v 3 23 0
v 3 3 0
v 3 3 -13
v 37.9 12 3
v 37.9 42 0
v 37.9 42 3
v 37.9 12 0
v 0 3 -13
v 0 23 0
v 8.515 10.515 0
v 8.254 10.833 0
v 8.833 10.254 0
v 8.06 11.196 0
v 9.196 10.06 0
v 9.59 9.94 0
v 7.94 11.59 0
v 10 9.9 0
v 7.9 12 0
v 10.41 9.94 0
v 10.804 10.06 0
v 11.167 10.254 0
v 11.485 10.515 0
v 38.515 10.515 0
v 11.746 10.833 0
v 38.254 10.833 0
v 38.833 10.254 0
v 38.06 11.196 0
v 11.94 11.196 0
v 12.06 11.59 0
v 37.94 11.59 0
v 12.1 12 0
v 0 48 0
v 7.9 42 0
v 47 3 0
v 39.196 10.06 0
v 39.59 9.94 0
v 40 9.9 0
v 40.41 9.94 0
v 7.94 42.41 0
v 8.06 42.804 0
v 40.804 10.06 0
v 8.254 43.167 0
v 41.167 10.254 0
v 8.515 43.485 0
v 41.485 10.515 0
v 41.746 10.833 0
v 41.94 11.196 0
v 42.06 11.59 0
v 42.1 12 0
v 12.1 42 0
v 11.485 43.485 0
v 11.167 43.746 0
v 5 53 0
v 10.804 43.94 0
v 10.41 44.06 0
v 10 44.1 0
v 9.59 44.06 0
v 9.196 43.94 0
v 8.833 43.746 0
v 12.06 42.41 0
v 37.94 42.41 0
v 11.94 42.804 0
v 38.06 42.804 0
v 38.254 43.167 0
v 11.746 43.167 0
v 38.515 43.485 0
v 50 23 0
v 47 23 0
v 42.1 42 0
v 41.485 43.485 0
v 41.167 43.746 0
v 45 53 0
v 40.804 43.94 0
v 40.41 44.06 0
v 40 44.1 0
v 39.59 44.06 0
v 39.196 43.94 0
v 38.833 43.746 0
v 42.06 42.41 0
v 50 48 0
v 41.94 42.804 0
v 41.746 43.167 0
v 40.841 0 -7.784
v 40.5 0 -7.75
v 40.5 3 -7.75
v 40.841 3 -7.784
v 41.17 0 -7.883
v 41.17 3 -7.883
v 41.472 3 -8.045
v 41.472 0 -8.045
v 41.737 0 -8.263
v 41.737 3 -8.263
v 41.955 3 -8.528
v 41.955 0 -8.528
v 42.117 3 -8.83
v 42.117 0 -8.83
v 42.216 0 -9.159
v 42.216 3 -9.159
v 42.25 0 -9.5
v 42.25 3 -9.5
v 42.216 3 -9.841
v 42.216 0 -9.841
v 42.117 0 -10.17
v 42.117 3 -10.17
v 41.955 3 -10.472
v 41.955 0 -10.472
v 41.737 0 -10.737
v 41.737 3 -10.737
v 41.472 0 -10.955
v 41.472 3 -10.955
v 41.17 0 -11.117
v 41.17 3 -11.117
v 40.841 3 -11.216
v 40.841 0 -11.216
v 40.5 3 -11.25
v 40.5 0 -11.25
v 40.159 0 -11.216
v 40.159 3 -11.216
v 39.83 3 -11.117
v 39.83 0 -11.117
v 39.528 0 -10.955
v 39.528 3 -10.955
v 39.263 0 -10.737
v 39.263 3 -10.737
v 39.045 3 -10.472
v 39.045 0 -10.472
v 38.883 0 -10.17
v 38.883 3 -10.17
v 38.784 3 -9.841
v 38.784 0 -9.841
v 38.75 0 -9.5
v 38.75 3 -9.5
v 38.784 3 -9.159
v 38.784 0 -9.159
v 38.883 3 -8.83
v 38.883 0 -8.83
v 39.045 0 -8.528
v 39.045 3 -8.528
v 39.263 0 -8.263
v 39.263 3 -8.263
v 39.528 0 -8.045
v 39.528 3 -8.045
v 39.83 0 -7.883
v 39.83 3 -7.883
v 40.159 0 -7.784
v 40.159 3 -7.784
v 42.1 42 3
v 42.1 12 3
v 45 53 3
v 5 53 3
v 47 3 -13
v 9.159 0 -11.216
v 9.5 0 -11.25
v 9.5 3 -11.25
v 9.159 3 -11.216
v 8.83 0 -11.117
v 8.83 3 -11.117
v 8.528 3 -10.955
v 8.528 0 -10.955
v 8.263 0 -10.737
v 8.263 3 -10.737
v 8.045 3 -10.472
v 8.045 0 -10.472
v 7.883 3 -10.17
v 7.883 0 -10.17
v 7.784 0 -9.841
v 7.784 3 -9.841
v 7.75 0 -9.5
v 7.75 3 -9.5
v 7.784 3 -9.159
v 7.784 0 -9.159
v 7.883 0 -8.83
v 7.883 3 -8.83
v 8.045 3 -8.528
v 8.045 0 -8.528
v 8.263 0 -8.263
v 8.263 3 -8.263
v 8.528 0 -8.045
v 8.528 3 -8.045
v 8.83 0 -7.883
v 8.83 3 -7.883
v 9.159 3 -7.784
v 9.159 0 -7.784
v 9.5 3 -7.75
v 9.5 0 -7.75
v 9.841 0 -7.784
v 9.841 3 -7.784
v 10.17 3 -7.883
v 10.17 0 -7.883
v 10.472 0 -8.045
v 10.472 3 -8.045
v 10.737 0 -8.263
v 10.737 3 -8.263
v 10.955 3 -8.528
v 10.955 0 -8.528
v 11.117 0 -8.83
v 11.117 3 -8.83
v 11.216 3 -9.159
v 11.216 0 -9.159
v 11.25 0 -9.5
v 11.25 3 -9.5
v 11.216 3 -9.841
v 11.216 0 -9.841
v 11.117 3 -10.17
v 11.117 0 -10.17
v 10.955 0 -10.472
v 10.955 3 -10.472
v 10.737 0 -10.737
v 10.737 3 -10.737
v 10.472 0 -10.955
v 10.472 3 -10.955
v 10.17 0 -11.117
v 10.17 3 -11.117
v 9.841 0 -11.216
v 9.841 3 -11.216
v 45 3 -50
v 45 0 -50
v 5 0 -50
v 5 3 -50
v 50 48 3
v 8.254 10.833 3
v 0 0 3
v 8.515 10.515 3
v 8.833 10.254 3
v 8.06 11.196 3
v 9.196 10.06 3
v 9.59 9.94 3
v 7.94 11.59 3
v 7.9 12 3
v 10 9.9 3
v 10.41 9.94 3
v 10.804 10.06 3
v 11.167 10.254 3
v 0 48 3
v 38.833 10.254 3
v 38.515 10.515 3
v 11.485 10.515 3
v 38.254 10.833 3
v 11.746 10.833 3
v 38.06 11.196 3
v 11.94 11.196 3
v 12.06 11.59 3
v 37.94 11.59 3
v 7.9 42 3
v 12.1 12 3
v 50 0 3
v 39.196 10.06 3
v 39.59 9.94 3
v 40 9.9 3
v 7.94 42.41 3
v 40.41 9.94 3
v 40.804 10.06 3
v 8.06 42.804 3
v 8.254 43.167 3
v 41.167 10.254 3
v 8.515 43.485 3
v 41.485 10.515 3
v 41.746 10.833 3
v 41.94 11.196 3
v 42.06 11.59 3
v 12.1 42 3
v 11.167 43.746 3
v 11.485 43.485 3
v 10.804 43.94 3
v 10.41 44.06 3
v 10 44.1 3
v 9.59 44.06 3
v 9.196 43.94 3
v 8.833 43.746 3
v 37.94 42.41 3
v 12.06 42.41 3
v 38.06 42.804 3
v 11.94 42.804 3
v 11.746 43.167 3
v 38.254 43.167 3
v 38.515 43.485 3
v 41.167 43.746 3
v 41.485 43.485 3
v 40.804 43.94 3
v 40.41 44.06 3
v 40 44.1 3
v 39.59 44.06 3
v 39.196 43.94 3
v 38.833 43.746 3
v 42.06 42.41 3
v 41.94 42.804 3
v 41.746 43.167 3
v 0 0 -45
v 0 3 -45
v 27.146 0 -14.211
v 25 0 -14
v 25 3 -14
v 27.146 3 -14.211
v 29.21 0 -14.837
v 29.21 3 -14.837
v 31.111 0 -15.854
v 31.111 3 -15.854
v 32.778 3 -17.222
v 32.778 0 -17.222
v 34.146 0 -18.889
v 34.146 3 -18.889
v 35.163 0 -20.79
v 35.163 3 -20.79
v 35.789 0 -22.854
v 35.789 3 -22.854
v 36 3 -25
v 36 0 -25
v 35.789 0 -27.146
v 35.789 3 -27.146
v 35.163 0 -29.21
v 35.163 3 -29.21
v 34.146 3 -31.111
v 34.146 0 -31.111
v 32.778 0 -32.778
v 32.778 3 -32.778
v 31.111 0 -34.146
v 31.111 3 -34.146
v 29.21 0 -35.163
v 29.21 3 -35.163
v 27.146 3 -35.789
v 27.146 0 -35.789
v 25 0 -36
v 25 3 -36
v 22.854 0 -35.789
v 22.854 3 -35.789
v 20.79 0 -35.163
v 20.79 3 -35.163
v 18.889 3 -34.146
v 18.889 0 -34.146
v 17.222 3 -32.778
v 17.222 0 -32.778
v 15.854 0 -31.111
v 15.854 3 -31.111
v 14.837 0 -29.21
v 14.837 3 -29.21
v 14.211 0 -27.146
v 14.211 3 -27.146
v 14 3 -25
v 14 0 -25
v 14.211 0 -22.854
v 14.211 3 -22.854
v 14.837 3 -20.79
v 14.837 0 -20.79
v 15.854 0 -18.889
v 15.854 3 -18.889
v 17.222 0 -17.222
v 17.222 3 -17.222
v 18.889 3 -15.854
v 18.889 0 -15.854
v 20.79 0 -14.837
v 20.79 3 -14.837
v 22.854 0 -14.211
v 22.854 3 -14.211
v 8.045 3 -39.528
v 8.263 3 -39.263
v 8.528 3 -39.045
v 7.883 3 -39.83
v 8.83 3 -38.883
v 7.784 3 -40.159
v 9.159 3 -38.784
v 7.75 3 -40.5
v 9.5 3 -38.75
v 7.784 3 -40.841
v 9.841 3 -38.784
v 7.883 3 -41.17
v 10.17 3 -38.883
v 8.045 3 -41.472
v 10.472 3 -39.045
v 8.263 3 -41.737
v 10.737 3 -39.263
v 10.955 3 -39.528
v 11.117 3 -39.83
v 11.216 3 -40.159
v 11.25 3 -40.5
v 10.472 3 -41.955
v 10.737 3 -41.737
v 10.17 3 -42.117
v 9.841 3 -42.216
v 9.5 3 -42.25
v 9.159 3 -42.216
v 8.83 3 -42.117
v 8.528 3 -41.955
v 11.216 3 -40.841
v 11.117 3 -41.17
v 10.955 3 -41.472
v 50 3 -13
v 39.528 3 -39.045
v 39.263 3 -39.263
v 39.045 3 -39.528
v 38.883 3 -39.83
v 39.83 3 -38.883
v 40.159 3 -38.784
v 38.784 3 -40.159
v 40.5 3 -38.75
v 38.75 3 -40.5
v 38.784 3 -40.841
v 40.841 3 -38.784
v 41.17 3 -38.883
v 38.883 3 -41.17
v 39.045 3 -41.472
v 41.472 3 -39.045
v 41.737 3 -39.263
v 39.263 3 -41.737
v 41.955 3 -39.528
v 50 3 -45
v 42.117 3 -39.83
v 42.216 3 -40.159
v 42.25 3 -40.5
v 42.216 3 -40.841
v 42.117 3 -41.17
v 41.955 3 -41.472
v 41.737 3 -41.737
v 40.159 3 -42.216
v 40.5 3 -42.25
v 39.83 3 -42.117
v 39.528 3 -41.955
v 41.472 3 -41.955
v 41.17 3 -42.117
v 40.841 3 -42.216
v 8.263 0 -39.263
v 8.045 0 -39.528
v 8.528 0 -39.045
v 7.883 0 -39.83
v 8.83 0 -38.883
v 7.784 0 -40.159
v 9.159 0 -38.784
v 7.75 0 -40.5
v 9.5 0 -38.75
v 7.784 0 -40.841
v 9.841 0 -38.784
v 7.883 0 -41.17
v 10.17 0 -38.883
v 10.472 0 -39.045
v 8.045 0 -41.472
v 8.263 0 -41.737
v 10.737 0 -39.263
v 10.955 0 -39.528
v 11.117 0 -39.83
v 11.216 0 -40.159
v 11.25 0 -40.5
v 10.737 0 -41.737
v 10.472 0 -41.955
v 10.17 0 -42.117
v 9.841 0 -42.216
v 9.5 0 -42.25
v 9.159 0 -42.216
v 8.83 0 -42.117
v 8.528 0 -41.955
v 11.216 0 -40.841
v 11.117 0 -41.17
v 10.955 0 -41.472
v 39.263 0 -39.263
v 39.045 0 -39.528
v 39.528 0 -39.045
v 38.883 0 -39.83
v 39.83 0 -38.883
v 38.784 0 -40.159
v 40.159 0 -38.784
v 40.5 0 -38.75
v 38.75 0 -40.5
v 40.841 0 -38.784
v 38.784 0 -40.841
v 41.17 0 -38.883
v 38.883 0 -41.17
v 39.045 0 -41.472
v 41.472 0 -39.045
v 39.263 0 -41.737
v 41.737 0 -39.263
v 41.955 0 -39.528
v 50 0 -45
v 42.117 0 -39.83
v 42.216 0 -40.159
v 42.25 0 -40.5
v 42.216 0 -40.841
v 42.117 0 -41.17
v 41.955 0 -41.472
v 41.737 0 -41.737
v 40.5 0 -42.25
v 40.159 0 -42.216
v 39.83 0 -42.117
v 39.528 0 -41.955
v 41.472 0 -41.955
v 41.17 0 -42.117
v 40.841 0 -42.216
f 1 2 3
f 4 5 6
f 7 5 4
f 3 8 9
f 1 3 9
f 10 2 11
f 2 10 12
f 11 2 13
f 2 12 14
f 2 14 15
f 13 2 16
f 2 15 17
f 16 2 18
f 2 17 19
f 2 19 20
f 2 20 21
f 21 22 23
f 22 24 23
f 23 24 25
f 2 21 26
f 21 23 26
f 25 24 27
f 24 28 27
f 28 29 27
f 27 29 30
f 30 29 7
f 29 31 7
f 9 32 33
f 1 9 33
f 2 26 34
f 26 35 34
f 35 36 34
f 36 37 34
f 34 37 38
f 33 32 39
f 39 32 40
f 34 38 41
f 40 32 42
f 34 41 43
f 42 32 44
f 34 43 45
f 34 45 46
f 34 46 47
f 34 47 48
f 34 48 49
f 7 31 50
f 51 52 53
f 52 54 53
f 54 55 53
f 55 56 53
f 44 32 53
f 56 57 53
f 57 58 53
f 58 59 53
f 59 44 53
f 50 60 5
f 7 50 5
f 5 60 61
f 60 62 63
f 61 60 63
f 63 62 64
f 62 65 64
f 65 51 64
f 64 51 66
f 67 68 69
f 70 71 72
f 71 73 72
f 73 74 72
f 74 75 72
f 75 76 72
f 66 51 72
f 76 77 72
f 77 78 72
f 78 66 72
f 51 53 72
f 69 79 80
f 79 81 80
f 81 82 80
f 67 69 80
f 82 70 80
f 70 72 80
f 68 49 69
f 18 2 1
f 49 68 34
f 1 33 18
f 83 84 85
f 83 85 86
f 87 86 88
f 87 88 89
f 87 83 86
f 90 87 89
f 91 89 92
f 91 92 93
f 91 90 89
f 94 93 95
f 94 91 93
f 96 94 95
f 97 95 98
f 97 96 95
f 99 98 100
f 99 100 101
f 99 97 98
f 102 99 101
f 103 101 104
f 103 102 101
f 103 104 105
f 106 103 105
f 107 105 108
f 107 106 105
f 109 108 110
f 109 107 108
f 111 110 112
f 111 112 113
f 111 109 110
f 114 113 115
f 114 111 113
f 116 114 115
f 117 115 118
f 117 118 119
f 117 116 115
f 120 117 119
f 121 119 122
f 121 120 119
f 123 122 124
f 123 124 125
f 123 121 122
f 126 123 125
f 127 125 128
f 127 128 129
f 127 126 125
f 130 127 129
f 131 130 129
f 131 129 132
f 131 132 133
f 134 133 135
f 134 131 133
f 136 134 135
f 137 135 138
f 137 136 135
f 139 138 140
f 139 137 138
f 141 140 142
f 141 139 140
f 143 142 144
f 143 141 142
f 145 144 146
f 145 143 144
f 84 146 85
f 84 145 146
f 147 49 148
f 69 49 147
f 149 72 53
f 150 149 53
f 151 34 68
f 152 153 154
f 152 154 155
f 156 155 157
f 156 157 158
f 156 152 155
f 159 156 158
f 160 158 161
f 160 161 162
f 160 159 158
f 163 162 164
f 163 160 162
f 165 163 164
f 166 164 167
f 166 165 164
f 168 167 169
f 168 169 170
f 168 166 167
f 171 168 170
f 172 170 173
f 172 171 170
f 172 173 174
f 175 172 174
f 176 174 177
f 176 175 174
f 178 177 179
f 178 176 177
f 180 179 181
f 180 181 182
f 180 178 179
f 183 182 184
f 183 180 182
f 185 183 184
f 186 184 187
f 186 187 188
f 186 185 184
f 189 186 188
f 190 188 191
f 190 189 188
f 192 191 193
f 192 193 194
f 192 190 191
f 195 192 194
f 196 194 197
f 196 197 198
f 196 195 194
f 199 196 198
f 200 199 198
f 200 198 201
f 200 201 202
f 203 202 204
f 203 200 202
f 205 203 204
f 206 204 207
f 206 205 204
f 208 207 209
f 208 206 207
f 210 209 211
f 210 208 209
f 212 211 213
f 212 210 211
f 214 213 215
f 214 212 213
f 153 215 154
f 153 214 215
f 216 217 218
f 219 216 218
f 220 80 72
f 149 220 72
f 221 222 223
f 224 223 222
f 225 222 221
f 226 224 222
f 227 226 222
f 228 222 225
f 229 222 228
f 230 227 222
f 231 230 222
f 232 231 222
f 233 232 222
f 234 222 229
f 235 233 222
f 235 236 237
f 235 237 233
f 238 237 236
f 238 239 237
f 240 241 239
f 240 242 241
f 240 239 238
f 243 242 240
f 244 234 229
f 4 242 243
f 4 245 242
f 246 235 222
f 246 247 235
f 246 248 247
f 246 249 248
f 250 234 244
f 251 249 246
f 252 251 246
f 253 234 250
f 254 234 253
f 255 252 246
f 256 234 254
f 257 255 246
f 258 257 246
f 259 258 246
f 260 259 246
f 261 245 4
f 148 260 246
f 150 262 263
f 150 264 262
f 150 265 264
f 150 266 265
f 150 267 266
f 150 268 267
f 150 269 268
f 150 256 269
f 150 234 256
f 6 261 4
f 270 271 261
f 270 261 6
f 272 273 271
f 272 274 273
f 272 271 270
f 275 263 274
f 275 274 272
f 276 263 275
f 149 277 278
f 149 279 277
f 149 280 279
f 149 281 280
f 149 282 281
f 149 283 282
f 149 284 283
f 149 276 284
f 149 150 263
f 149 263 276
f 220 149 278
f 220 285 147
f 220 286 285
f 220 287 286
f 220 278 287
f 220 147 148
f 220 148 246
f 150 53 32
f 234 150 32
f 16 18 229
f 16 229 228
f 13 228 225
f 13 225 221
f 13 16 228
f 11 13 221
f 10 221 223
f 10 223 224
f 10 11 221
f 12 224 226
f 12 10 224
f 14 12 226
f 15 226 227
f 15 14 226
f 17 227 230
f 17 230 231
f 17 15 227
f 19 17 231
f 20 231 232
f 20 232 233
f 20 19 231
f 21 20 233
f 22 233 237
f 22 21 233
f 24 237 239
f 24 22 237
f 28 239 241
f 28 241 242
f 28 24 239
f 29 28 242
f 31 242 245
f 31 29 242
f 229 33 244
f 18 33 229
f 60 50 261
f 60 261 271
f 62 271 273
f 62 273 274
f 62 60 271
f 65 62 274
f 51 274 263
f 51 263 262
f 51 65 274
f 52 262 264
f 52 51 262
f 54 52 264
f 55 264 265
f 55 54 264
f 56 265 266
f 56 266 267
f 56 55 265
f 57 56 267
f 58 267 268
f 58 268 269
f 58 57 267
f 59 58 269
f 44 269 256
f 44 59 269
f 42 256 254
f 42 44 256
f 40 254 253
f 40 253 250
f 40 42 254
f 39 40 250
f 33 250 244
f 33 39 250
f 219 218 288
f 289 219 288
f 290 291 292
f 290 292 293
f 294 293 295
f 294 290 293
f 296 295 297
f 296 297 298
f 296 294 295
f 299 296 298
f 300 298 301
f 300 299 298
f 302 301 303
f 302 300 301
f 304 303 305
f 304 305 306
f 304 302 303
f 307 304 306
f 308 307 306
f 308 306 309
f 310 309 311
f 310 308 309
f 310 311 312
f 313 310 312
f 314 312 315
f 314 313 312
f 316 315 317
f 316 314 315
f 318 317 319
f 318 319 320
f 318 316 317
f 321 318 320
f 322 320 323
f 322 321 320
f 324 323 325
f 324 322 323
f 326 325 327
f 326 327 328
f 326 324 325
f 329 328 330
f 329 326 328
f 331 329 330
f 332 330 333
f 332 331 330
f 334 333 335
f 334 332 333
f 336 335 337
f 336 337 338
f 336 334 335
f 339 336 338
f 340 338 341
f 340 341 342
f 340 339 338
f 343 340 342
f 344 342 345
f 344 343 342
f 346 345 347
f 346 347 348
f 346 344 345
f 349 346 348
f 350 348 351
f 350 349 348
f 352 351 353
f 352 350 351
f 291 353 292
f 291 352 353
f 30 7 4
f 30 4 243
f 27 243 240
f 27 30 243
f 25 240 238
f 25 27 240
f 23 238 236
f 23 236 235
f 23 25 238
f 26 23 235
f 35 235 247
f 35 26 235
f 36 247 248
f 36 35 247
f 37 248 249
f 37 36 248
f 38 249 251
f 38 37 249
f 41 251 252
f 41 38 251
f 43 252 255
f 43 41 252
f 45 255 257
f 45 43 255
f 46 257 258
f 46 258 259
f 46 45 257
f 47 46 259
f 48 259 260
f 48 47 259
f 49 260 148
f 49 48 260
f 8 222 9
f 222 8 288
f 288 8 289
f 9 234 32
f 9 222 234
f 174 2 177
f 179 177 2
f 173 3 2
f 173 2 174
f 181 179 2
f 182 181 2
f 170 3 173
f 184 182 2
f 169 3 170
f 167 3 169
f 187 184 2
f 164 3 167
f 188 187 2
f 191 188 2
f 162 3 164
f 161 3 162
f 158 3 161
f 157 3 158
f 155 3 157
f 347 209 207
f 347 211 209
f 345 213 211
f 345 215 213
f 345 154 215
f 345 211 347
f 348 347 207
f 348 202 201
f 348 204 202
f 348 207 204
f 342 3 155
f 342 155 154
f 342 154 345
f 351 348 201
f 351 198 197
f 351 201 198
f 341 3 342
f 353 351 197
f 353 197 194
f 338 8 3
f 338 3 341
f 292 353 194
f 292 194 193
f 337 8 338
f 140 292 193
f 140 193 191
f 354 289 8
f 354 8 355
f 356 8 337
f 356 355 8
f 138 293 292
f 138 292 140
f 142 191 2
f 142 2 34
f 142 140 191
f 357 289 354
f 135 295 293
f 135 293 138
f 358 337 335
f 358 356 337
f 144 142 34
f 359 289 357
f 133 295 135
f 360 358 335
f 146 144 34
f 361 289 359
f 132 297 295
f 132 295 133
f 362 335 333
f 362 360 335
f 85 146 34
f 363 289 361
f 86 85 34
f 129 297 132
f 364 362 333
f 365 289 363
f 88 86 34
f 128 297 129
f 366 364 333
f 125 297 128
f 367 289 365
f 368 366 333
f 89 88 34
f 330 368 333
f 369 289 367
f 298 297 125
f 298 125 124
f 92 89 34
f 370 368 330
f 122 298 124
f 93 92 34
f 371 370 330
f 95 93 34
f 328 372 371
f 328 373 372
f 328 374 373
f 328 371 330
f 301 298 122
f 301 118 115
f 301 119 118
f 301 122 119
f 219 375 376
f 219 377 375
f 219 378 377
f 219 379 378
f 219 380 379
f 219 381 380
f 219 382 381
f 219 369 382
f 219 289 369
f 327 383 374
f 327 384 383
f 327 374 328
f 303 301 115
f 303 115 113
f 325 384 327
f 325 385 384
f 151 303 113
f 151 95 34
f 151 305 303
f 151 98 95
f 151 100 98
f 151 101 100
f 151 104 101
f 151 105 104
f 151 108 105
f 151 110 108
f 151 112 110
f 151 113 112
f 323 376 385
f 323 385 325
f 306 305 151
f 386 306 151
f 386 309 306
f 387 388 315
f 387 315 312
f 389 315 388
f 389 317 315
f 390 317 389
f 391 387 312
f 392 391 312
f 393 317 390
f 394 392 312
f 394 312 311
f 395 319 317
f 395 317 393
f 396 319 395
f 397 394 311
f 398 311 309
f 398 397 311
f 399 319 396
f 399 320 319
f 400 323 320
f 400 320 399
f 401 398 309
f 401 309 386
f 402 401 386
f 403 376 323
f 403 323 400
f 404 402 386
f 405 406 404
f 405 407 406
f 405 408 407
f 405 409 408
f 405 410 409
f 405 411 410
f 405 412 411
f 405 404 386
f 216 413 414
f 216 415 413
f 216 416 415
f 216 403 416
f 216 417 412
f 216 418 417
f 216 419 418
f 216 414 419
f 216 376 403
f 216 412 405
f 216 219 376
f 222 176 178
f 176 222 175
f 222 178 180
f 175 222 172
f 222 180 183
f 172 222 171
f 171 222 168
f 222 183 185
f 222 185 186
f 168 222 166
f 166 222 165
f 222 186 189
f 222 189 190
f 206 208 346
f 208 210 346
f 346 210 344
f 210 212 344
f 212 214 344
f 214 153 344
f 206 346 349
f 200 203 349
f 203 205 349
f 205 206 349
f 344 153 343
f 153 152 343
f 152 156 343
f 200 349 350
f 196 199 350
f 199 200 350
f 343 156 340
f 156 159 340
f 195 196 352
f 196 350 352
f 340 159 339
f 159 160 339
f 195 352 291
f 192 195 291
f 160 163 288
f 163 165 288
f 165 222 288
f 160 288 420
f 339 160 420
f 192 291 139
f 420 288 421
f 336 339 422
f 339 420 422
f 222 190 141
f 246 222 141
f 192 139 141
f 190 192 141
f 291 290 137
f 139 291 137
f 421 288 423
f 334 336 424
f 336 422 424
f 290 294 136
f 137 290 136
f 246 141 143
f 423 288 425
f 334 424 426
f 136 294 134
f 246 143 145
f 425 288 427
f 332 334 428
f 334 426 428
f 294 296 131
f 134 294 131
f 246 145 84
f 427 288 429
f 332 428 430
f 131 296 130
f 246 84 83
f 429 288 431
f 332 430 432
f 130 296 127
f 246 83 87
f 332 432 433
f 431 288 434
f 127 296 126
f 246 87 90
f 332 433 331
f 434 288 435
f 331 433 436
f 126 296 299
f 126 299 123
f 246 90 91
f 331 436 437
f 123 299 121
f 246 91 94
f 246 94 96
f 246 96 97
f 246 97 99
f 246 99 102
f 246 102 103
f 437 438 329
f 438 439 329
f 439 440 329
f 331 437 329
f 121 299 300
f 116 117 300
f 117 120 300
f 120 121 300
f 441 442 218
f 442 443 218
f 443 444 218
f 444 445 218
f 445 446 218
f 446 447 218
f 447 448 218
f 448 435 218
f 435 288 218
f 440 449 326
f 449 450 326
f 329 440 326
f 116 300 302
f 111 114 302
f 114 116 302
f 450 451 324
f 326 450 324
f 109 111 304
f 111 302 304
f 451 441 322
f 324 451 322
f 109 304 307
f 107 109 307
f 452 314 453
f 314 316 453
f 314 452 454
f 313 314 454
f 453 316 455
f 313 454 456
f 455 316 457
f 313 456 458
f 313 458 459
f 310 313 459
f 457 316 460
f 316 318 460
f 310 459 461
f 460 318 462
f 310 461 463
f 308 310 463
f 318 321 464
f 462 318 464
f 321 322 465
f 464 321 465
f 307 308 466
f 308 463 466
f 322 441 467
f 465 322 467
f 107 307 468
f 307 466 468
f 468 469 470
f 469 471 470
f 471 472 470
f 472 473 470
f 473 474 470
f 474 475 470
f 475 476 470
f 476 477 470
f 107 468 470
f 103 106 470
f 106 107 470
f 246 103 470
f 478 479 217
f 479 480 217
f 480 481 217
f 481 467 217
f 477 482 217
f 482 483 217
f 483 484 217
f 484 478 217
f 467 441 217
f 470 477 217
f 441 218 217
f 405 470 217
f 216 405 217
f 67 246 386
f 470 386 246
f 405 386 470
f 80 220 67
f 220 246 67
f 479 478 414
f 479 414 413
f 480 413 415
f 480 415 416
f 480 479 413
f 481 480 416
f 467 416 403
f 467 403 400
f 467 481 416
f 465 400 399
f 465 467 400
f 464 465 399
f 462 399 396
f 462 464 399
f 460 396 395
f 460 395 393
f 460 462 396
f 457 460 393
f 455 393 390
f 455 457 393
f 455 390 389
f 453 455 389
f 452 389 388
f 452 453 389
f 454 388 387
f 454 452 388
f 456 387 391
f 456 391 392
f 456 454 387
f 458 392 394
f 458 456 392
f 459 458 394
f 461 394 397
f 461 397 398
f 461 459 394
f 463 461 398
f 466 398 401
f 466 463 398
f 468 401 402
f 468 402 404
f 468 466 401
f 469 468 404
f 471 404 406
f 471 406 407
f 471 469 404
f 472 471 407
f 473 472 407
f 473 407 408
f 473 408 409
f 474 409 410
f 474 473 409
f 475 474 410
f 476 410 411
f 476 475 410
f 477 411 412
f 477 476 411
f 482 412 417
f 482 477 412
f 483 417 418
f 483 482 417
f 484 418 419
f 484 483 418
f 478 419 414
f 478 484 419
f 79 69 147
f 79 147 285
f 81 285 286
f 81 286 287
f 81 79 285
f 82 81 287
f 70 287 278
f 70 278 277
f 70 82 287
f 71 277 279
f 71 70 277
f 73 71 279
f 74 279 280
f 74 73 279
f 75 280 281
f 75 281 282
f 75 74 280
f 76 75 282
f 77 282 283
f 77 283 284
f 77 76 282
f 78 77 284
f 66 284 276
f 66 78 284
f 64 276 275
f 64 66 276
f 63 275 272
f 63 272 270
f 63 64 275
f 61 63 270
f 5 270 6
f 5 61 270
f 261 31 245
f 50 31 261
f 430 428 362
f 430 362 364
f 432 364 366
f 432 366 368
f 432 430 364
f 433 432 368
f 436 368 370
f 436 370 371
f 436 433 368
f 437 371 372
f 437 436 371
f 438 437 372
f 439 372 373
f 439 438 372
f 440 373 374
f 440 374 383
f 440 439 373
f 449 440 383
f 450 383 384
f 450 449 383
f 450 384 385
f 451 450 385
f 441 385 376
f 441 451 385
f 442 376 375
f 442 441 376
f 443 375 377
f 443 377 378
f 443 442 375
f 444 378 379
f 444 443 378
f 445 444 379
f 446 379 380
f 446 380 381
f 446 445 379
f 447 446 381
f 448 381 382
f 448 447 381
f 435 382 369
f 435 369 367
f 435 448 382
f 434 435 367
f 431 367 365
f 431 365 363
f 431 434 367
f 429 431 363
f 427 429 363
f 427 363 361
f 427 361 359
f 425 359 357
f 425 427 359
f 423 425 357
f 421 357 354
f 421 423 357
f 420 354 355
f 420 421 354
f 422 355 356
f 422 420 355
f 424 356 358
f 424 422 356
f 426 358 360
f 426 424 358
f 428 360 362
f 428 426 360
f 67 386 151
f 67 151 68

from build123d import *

# Parameters (mm, degrees)
SKETCH_1_R      = 11
SKETCH_1_R_2    = 1.75
EXTRUDE_1_DEPTH = 3
EXTRUDE_2_DEPTH = 3
EXTRUDE_3_DEPTH = 3
EXTRUDE_4_DEPTH = 3


with BuildPart() as part:
    # 草图1 → 凸台-拉伸1 (new body)
    with BuildSketch(Plane(origin=(0, 0, 0), x_dir=(1, 0, 0), z_dir=(0, 1, 0))):
        Polygon((0, 0), (50, 0), (50, 45), (45, 50), (5, 50), (0, 45), align=None)
        with Locations(Location((25, 25, 0), (0, 0, 270))):
            Circle(SKETCH_1_R, mode=Mode.SUBTRACT)
        with Locations(Location((9.5, 40.5, 0), (0, 0, 270))):
            Circle(SKETCH_1_R_2, mode=Mode.SUBTRACT)
        with Locations(Location((40.5, 40.5, 0), (0, 0, 90))):
            Circle(SKETCH_1_R_2, mode=Mode.SUBTRACT)
        with Locations(Location((40.5, 9.5, 0), (0, 0, 270))):
            Circle(SKETCH_1_R_2, mode=Mode.SUBTRACT)
        with Locations(Location((9.5, 9.5, 0), (0, 0, 90))):
            Circle(SKETCH_1_R_2, mode=Mode.SUBTRACT)
    extrude(amount=EXTRUDE_1_DEPTH)

    # 草图2 → 凸台-拉伸2 (add)
    with BuildSketch(Plane.XY):
        Polygon((0, 0), (50, 0), (50, 48), (45, 53), (5, 53), (0, 48), align=None)
        with BuildLine():
            Line((7.9, 42), (7.9, 12))
            ThreePointArc((7.9, 12), (10, 9.9), (12.1, 12))
            Line((12.1, 12), (12.1, 42))
            ThreePointArc((12.1, 42), (10, 44.1), (7.9, 42))
        make_face(mode=Mode.SUBTRACT)
        with BuildLine():
            Line((37.9, 42), (37.9, 12))
            ThreePointArc((37.9, 12), (40, 9.9), (42.1, 12))
            Line((42.1, 12), (42.1, 42))
            ThreePointArc((42.1, 42), (40, 44.1), (37.9, 42))
        make_face(mode=Mode.SUBTRACT)
    extrude(amount=EXTRUDE_2_DEPTH)

    # 草图3 → 凸台-拉伸3 (add)
    with BuildSketch(Plane.ZY):
        Polygon((0, 3), (-13, 3), (0, 23), align=None)
    extrude(amount=-EXTRUDE_3_DEPTH)

    # 草图4 → 凸台-拉伸4 (add)
    with BuildSketch(Plane(origin=(50, 0, 0), x_dir=(0, 0, -1), z_dir=(1, 0, 0))):
        Polygon((0, 3), (13, 3), (0, 23), align=None)
    extrude(amount=-EXTRUDE_4_DEPTH)


solid = part.part
